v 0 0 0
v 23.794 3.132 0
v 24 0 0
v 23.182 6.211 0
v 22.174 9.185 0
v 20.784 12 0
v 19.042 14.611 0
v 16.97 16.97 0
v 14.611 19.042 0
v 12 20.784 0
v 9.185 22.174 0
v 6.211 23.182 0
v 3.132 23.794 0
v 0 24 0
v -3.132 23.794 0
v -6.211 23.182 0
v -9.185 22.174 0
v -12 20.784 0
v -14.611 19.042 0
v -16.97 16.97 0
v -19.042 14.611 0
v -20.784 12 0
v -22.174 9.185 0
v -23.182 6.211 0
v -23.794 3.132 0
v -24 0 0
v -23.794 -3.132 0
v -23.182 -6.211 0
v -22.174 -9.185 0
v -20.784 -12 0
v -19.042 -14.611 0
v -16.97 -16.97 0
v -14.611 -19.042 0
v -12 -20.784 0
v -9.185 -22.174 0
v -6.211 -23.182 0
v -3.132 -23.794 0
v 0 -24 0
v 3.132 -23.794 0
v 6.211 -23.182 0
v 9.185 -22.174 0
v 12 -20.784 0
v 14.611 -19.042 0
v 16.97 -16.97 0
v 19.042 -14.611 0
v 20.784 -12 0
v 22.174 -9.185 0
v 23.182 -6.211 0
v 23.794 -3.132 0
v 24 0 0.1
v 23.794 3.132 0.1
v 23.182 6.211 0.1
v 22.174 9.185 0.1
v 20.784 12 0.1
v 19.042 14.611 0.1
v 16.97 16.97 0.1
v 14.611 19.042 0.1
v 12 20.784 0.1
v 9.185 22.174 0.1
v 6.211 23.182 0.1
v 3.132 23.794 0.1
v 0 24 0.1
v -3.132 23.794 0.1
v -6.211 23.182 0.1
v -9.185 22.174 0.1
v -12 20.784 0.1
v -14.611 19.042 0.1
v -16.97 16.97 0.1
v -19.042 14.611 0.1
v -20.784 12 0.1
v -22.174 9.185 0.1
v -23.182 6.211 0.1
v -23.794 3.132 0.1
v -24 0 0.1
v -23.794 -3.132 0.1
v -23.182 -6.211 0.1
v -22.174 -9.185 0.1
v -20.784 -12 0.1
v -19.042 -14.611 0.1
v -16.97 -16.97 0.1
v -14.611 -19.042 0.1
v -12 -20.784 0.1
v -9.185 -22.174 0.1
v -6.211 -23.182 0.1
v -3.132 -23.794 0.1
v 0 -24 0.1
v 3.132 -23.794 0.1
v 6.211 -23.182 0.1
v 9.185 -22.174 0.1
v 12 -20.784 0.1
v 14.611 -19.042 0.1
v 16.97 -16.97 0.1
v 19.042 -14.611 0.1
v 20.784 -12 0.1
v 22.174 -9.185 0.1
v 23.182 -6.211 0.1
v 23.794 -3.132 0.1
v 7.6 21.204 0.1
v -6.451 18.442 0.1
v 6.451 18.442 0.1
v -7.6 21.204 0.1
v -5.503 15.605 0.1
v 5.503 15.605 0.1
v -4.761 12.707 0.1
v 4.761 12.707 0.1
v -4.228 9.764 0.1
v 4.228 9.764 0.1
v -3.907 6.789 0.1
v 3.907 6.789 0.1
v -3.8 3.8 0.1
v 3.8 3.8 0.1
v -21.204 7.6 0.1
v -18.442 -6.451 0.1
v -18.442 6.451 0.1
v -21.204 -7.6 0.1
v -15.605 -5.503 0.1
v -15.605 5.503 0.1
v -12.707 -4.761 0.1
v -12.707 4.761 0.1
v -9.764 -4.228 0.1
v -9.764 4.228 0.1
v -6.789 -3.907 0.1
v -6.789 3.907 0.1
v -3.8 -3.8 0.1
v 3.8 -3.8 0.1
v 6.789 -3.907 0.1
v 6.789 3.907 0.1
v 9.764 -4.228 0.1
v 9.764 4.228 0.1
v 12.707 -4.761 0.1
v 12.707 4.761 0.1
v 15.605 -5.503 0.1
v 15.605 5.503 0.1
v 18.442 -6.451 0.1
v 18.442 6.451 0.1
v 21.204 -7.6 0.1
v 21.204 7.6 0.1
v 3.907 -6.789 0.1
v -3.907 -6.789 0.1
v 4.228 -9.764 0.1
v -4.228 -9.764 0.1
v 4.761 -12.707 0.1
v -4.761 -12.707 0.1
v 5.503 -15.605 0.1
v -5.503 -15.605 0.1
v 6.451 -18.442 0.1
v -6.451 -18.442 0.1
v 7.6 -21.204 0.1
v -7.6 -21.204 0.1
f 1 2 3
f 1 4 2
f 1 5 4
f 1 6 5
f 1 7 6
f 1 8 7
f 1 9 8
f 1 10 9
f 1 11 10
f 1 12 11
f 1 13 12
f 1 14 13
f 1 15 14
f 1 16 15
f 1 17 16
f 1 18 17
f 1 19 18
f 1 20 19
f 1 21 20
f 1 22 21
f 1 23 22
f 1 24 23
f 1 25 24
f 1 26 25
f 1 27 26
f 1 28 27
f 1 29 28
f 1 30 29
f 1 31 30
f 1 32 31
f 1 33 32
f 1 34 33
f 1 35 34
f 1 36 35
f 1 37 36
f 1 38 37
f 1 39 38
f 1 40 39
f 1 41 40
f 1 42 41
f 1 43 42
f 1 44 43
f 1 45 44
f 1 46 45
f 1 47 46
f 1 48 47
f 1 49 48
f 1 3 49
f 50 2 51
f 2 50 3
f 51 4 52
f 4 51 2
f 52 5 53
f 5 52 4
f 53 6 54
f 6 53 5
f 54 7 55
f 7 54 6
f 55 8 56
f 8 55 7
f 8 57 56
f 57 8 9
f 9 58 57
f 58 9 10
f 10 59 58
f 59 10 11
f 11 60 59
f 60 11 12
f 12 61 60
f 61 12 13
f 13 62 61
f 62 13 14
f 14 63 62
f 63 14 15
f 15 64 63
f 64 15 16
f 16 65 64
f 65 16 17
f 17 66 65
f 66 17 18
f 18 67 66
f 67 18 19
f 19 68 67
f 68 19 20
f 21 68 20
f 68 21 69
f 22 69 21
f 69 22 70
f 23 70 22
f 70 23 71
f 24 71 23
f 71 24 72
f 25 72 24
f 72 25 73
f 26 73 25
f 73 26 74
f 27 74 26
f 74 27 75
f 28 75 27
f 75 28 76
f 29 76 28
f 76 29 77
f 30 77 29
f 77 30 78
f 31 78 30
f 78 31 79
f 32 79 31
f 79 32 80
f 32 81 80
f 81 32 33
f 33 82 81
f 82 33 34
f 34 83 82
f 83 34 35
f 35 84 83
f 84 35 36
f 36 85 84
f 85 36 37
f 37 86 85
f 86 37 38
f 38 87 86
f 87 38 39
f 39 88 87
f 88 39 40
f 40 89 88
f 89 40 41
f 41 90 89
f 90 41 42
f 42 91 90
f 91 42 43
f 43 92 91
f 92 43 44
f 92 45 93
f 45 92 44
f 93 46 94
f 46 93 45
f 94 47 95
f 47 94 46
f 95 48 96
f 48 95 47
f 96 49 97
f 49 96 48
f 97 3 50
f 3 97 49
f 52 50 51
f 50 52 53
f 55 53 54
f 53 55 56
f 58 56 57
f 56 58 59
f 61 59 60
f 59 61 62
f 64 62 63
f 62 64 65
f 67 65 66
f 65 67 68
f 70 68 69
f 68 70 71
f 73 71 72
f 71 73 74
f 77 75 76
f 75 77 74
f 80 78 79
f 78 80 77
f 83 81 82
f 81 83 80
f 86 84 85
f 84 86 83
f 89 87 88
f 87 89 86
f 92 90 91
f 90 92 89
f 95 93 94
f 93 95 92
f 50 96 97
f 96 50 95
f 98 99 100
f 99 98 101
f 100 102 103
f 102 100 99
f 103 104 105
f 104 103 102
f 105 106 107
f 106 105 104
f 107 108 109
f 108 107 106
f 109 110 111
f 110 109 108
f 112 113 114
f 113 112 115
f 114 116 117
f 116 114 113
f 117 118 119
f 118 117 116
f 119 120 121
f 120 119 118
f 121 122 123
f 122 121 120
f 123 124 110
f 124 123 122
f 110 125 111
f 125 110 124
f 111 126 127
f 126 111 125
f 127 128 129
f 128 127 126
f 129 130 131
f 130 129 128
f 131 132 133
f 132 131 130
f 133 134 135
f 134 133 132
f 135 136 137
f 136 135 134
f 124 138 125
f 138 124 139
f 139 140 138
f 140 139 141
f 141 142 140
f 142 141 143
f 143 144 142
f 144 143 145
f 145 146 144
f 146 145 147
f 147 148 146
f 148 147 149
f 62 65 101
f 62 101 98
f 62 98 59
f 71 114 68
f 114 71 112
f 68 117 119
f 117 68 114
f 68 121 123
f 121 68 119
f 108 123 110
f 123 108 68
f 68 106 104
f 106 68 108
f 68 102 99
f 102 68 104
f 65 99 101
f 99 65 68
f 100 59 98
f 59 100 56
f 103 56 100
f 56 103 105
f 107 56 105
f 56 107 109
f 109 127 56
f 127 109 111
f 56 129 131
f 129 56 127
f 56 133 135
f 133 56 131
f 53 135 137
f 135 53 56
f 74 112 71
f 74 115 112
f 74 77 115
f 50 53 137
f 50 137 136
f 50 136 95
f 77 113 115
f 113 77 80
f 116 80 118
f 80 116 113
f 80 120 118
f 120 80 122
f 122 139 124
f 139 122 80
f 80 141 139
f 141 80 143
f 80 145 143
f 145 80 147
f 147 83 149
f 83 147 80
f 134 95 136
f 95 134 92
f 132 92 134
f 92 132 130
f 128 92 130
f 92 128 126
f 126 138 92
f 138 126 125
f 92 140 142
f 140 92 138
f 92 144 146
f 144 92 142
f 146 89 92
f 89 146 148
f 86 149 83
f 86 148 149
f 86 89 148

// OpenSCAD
// file: ../p/48/1-4cyli.scad
use <../../lib.scad>
function ldraw_lib__48__1_4cyli() = [
// 0 Hi-Res Cylinder 0.25
// 0 Name: 48\1-4cyli.dat
// 0 Author: Manfred Moolhuysen
// 0 !LDRAW_ORG 48_Primitive UPDATE 2009-01
// 0 !LICENSE Licensed under CC BY 2.0 and CC BY 4.0 : see CAreadme.txt
// 
// 0 BFC CERTIFY CCW
  [0,"BFC","CERTIFY"],
  [0,"BFC","CCW"],
// 
// 0 !HISTORY 1999-07-05 [PTadmin] Official Update 1999-05
// 0 !HISTORY 2002-02-28 [hafhead] Added BFC statement
// 0 !HISTORY 2002-04-25 [PTadmin] Official Update 2002-02
// 0 !HISTORY 2007-06-24 [PTadmin] Header formatted for Contributor Agreement
// 0 !HISTORY 2008-07-01 [PTadmin] Official Update 2008-01
// 0 !HISTORY 2008-07-07 [guyvivan] Made BFC'ed CCW (2005-12-06)
// 0 !HISTORY 2009-05-02 [PTadmin] Official Update 2009-01
// 
// 
// 4 16 0.9914 0 0.1305 1 0 0 1 1 0 0.9914 1 0.1305
  [4,16,0.9914,0,0.1305,1,0,0,1,1,0,0.9914,1,0.1305],
// 4 16 0.9659 0 0.2588 0.9914 0 0.1305 0.9914 1 0.1305 0.9659 1 0.2588
  [4,16,0.9659,0,0.2588,0.9914,0,0.1305,0.9914,1,0.1305,0.9659,1,0.2588],
// 4 16 0.9239 0 0.3827 0.9659 0 0.2588 0.9659 1 0.2588 0.9239 1 0.3827
  [4,16,0.9239,0,0.3827,0.9659,0,0.2588,0.9659,1,0.2588,0.9239,1,0.3827],
// 4 16 0.866 0 0.5 0.9239 0 0.3827 0.9239 1 0.3827 0.866 1 0.5
  [4,16,0.866,0,0.5,0.9239,0,0.3827,0.9239,1,0.3827,0.866,1,0.5],
// 4 16 0.7934 0 0.6088 0.866 0 0.5 0.866 1 0.5 0.7934 1 0.6088
  [4,16,0.7934,0,0.6088,0.866,0,0.5,0.866,1,0.5,0.7934,1,0.6088],
// 4 16 0.7071 0 0.7071 0.7934 0 0.6088 0.7934 1 0.6088 0.7071 1 0.7071
  [4,16,0.7071,0,0.7071,0.7934,0,0.6088,0.7934,1,0.6088,0.7071,1,0.7071],
// 4 16 0.6088 0 0.7934 0.7071 0 0.7071 0.7071 1 0.7071 0.6088 1 0.7934
  [4,16,0.6088,0,0.7934,0.7071,0,0.7071,0.7071,1,0.7071,0.6088,1,0.7934],
// 4 16 0.5 0 0.866 0.6088 0 0.7934 0.6088 1 0.7934 0.5 1 0.866
  [4,16,0.5,0,0.866,0.6088,0,0.7934,0.6088,1,0.7934,0.5,1,0.866],
// 4 16 0.3827 0 0.9239 0.5 0 0.866 0.5 1 0.866 0.3827 1 0.9239
  [4,16,0.3827,0,0.9239,0.5,0,0.866,0.5,1,0.866,0.3827,1,0.9239],
// 4 16 0.2588 0 0.9659 0.3827 0 0.9239 0.3827 1 0.9239 0.2588 1 0.9659
  [4,16,0.2588,0,0.9659,0.3827,0,0.9239,0.3827,1,0.9239,0.2588,1,0.9659],
// 4 16 0.1305 0 0.9914 0.2588 0 0.9659 0.2588 1 0.9659 0.1305 1 0.9914
  [4,16,0.1305,0,0.9914,0.2588,0,0.9659,0.2588,1,0.9659,0.1305,1,0.9914],
// 4 16 0 0 1 0.1305 0 0.9914 0.1305 1 0.9914 0 1 1
  [4,16,0,0,1,0.1305,0,0.9914,0.1305,1,0.9914,0,1,1],
// 
// 0 conditional lines
// 5 24 1 1 0 1 0 0 1 1 -1 0.9914 1 0.1305
  [5,24,1,1,0,1,0,0,1,1,-1,0.9914,1,0.1305],
// 5 24 0.9914 1 0.1305 0.9914 0 0.1305 1 1 0 0.9659 1 0.2588
  [5,24,0.9914,1,0.1305,0.9914,0,0.1305,1,1,0,0.9659,1,0.2588],
// 5 24 0.9659 1 0.2588 0.9659 0 0.2588 0.9914 1 0.1305 0.9239 1 0.3827
  [5,24,0.9659,1,0.2588,0.9659,0,0.2588,0.9914,1,0.1305,0.9239,1,0.3827],
// 5 24 0.9239 1 0.3827 0.9239 0 0.3827 0.9659 1 0.2588 0.866 1 0.5
  [5,24,0.9239,1,0.3827,0.9239,0,0.3827,0.9659,1,0.2588,0.866,1,0.5],
// 5 24 0.866 1 0.5 0.866 0 0.5 0.9239 1 0.3827 0.7934 1 0.6088
  [5,24,0.866,1,0.5,0.866,0,0.5,0.9239,1,0.3827,0.7934,1,0.6088],
// 5 24 0.7934 1 0.6088 0.7934 0 0.6088 0.866 1 0.5 0.7071 1 0.7071
  [5,24,0.7934,1,0.6088,0.7934,0,0.6088,0.866,1,0.5,0.7071,1,0.7071],
// 5 24 0.7071 1 0.7071 0.7071 0 0.7071 0.7934 1 0.6088 0.6088 1 0.7934
  [5,24,0.7071,1,0.7071,0.7071,0,0.7071,0.7934,1,0.6088,0.6088,1,0.7934],
// 5 24 0.6088 1 0.7934 0.6088 0 0.7934 0.7071 1 0.7071 0.5 1 0.866
  [5,24,0.6088,1,0.7934,0.6088,0,0.7934,0.7071,1,0.7071,0.5,1,0.866],
// 5 24 0.5 1 0.866 0.5 0 0.866 0.6088 1 0.7934 0.3827 1 0.9239
  [5,24,0.5,1,0.866,0.5,0,0.866,0.6088,1,0.7934,0.3827,1,0.9239],
// 5 24 0.3827 1 0.9239 0.3827 0 0.9239 0.5 1 0.866 0.2588 1 0.9659
  [5,24,0.3827,1,0.9239,0.3827,0,0.9239,0.5,1,0.866,0.2588,1,0.9659],
// 5 24 0.2588 1 0.9659 0.2588 0 0.9659 0.3827 1 0.9239 0.1305 1 0.9914
  [5,24,0.2588,1,0.9659,0.2588,0,0.9659,0.3827,1,0.9239,0.1305,1,0.9914],
// 5 24 0.1305 1 0.9914 0.1305 0 0.9914 0.2588 1 0.9659 0 1 1
  [5,24,0.1305,1,0.9914,0.1305,0,0.9914,0.2588,1,0.9659,0,1,1],
// 5 24 0 1 1 0 0 1 0.1305 1 0.9914 -1 1 1
  [5,24,0,1,1,0,0,1,0.1305,1,0.9914,-1,1,1],
// 
// 0 end of file
];
module ldraw_lib__48__1_4cyli(step=0, col=false, unit=2/5, alt=false, line=0.2, solid=!$preview)
    makepoly(ldraw_lib__48__1_4cyli(), step=step, col=col, unit=unit, alt=alt, line=line, solid=solid);
ldraw_lib__48__1_4cyli(line=0.2);
// file: ../p/48/4-4disc.scad
use <../../lib.scad>
function ldraw_lib__48__4_4disc() = [
// 0 Hi-Res Disc 1.0
// 0 Name: 48\4-4disc.dat
// 0 Author: Miklos Hosszu [hmick]
// 0 !LDRAW_ORG 48_Primitive UPDATE 2012-02
// 0 !LICENSE Licensed under CC BY 2.0 and CC BY 4.0 : see CAreadme.txt
// 
// 0 BFC CERTIFY CCW
  [0,"BFC","CERTIFY"],
  [0,"BFC","CCW"],
// 
// 0 !HISTORY 2004-11-06 [PTadmin] Official Update 2004-04
// 0 !HISTORY 2007-06-24 [PTadmin] Header formatted for Contributor Agreement
// 0 !HISTORY 2008-07-01 [PTadmin] Official Update 2008-01
// 0 !HISTORY 2012-02-27 [Philo] Changed to CCW
// 0 !HISTORY 2012-08-09 [PTadmin] Official Update 2012-02
// 
// 
// 3 16 1 0 0 0.9914 0 0.1305 0 0 0
  [3,16,1,0,0,0.9914,0,0.1305,0,0,0],
// 3 16 0.9914 0 0.1305 0.9659 0 0.2588 0 0 0
  [3,16,0.9914,0,0.1305,0.9659,0,0.2588,0,0,0],
// 3 16 0.9659 0 0.2588 0.9239 0 0.3827 0 0 0
  [3,16,0.9659,0,0.2588,0.9239,0,0.3827,0,0,0],
// 3 16 0.9239 0 0.3827 0.866 0 0.5 0 0 0
  [3,16,0.9239,0,0.3827,0.866,0,0.5,0,0,0],
// 3 16 0.866 0 0.5 0.7934 0 0.6088 0 0 0
  [3,16,0.866,0,0.5,0.7934,0,0.6088,0,0,0],
// 3 16 0.7934 0 0.6088 0.7071 0 0.7071 0 0 0
  [3,16,0.7934,0,0.6088,0.7071,0,0.7071,0,0,0],
// 3 16 0.7071 0 0.7071 0.6088 0 0.7934 0 0 0
  [3,16,0.7071,0,0.7071,0.6088,0,0.7934,0,0,0],
// 3 16 0.6088 0 0.7934 0.5 0 0.866 0 0 0
  [3,16,0.6088,0,0.7934,0.5,0,0.866,0,0,0],
// 3 16 0.5 0 0.866 0.3827 0 0.9239 0 0 0
  [3,16,0.5,0,0.866,0.3827,0,0.9239,0,0,0],
// 3 16 0.3827 0 0.9239 0.2588 0 0.9659 0 0 0
  [3,16,0.3827,0,0.9239,0.2588,0,0.9659,0,0,0],
// 3 16 0.2588 0 0.9659 0.1305 0 0.9914 0 0 0
  [3,16,0.2588,0,0.9659,0.1305,0,0.9914,0,0,0],
// 3 16 0.1305 0 0.9914 0 0 1 0 0 0
  [3,16,0.1305,0,0.9914,0,0,1,0,0,0],
// 3 16 0 0 1 -0.1305 0 0.9914 0 0 0
  [3,16,0,0,1,-0.1305,0,0.9914,0,0,0],
// 3 16 -0.1305 0 0.9914 -0.2588 0 0.9659 0 0 0
  [3,16,-0.1305,0,0.9914,-0.2588,0,0.9659,0,0,0],
// 3 16 -0.2588 0 0.9659 -0.3827 0 0.9239 0 0 0
  [3,16,-0.2588,0,0.9659,-0.3827,0,0.9239,0,0,0],
// 3 16 -0.3827 0 0.9239 -0.5 0 0.866 0 0 0
  [3,16,-0.3827,0,0.9239,-0.5,0,0.866,0,0,0],
// 3 16 -0.5 0 0.866 -0.6088 0 0.7934 0 0 0
  [3,16,-0.5,0,0.866,-0.6088,0,0.7934,0,0,0],
// 3 16 -0.6088 0 0.7934 -0.7071 0 0.7071 0 0 0
  [3,16,-0.6088,0,0.7934,-0.7071,0,0.7071,0,0,0],
// 3 16 -0.7071 0 0.7071 -0.7934 0 0.6088 0 0 0
  [3,16,-0.7071,0,0.7071,-0.7934,0,0.6088,0,0,0],
// 3 16 -0.7934 0 0.6088 -0.866 0 0.5 0 0 0
  [3,16,-0.7934,0,0.6088,-0.866,0,0.5,0,0,0],
// 3 16 -0.866 0 0.5 -0.9239 0 0.3827 0 0 0
  [3,16,-0.866,0,0.5,-0.9239,0,0.3827,0,0,0],
// 3 16 -0.9239 0 0.3827 -0.9659 0 0.2588 0 0 0
  [3,16,-0.9239,0,0.3827,-0.9659,0,0.2588,0,0,0],
// 3 16 -0.9659 0 0.2588 -0.9914 0 0.1305 0 0 0
  [3,16,-0.9659,0,0.2588,-0.9914,0,0.1305,0,0,0],
// 3 16 -0.9914 0 0.1305 -1 0 0 0 0 0
  [3,16,-0.9914,0,0.1305,-1,0,0,0,0,0],
// 3 16 -1 0 0 -0.9914 0 -0.1305 0 0 0
  [3,16,-1,0,0,-0.9914,0,-0.1305,0,0,0],
// 3 16 -0.9914 0 -0.1305 -0.9659 0 -0.2588 0 0 0
  [3,16,-0.9914,0,-0.1305,-0.9659,0,-0.2588,0,0,0],
// 3 16 -0.9659 0 -0.2588 -0.9239 0 -0.3827 0 0 0
  [3,16,-0.9659,0,-0.2588,-0.9239,0,-0.3827,0,0,0],
// 3 16 -0.9239 0 -0.3827 -0.866 0 -0.5 0 0 0
  [3,16,-0.9239,0,-0.3827,-0.866,0,-0.5,0,0,0],
// 3 16 -0.866 0 -0.5 -0.7934 0 -0.6088 0 0 0
  [3,16,-0.866,0,-0.5,-0.7934,0,-0.6088,0,0,0],
// 3 16 -0.7934 0 -0.6088 -0.7071 0 -0.7071 0 0 0
  [3,16,-0.7934,0,-0.6088,-0.7071,0,-0.7071,0,0,0],
// 3 16 -0.7071 0 -0.7071 -0.6088 0 -0.7934 0 0 0
  [3,16,-0.7071,0,-0.7071,-0.6088,0,-0.7934,0,0,0],
// 3 16 -0.6088 0 -0.7934 -0.5 0 -0.866 0 0 0
  [3,16,-0.6088,0,-0.7934,-0.5,0,-0.866,0,0,0],
// 3 16 -0.5 0 -0.866 -0.3827 0 -0.9239 0 0 0
  [3,16,-0.5,0,-0.866,-0.3827,0,-0.9239,0,0,0],
// 3 16 -0.3827 0 -0.9239 -0.2588 0 -0.9659 0 0 0
  [3,16,-0.3827,0,-0.9239,-0.2588,0,-0.9659,0,0,0],
// 3 16 -0.2588 0 -0.9659 -0.1305 0 -0.9914 0 0 0
  [3,16,-0.2588,0,-0.9659,-0.1305,0,-0.9914,0,0,0],
// 3 16 -0.1305 0 -0.9914 0 0 -1 0 0 0
  [3,16,-0.1305,0,-0.9914,0,0,-1,0,0,0],
// 3 16 0 0 -1 0.1305 0 -0.9914 0 0 0
  [3,16,0,0,-1,0.1305,0,-0.9914,0,0,0],
// 3 16 0.1305 0 -0.9914 0.2588 0 -0.9659 0 0 0
  [3,16,0.1305,0,-0.9914,0.2588,0,-0.9659,0,0,0],
// 3 16 0.2588 0 -0.9659 0.3827 0 -0.9239 0 0 0
  [3,16,0.2588,0,-0.9659,0.3827,0,-0.9239,0,0,0],
// 3 16 0.3827 0 -0.9239 0.5 0 -0.866 0 0 0
  [3,16,0.3827,0,-0.9239,0.5,0,-0.866,0,0,0],
// 3 16 0.5 0 -0.866 0.6088 0 -0.7934 0 0 0
  [3,16,0.5,0,-0.866,0.6088,0,-0.7934,0,0,0],
// 3 16 0.6088 0 -0.7934 0.7071 0 -0.7071 0 0 0
  [3,16,0.6088,0,-0.7934,0.7071,0,-0.7071,0,0,0],
// 3 16 0.7071 0 -0.7071 0.7934 0 -0.6088 0 0 0
  [3,16,0.7071,0,-0.7071,0.7934,0,-0.6088,0,0,0],
// 3 16 0.7934 0 -0.6088 0.866 0 -0.5 0 0 0
  [3,16,0.7934,0,-0.6088,0.866,0,-0.5,0,0,0],
// 3 16 0.866 0 -0.5 0.9239 0 -0.3827 0 0 0
  [3,16,0.866,0,-0.5,0.9239,0,-0.3827,0,0,0],
// 3 16 0.9239 0 -0.3827 0.9659 0 -0.2588 0 0 0
  [3,16,0.9239,0,-0.3827,0.9659,0,-0.2588,0,0,0],
// 3 16 0.9659 0 -0.2588 0.9914 0 -0.1305 0 0 0
  [3,16,0.9659,0,-0.2588,0.9914,0,-0.1305,0,0,0],
// 3 16 0.9914 0 -0.1305 1 0 0 0 0 0
  [3,16,0.9914,0,-0.1305,1,0,0,0,0,0],
];
module ldraw_lib__48__4_4disc(step=0, col=false, unit=2/5, alt=false, line=0.2, solid=!$preview)
    makepoly(ldraw_lib__48__4_4disc(), step=step, col=col, unit=unit, alt=alt, line=line, solid=solid);
ldraw_lib__48__4_4disc(line=0.2);
// file: ../p/48/4-4cyli.scad
use <../../lib.scad>
use <1-4cyli.scad>
function ldraw_lib__48__4_4cyli() = [
// 0 Hi-Res Cylinder 1.0
// 0 Name: 48\4-4cyli.dat
// 0 Author: Paul Easter [pneaster]
// 0 !LDRAW_ORG 48_Primitive UPDATE 2012-02
// 0 !LICENSE Licensed under CC BY 4.0 : see CAreadme.txt
// 
// 0 BFC CERTIFY CCW
  [0,"BFC","CERTIFY"],
  [0,"BFC","CCW"],
// 
// 0 !HISTORY 2002-08-18 [PTadmin] Official Update 2002-04
// 0 !HISTORY 2007-06-24 [PTadmin] Header formatted for Contributor Agreement
// 0 !HISTORY 2008-07-01 [PTadmin] Official Update 2008-01
// 0 !HISTORY 2012-02-27 [Philo] Changed to CCW
// 0 !HISTORY 2012-08-09 [PTadmin] Official Update 2012-02
// 
// 
// 1 16 0 0 0 1 0 0 0 1 0 0 0 1 48\1-4cyli.dat
  [1,16,0,0,0,1,0,0,0,1,0,0,0,1, ldraw_lib__48__1_4cyli()],
// 1 16 0 0 0 0 0 -1 0 1 0 1 0 0 48\1-4cyli.dat
  [1,16,0,0,0,0,0,-1,0,1,0,1,0,0, ldraw_lib__48__1_4cyli()],
// 1 16 0 0 0 -1 0 0 0 1 0 0 0 -1 48\1-4cyli.dat
  [1,16,0,0,0,-1,0,0,0,1,0,0,0,-1, ldraw_lib__48__1_4cyli()],
// 1 16 0 0 0 0 0 1 0 1 0 -1 0 0 48\1-4cyli.dat
  [1,16,0,0,0,0,0,1,0,1,0,-1,0,0, ldraw_lib__48__1_4cyli()],
];
module ldraw_lib__48__4_4cyli(step=0, col=false, unit=2/5, alt=false, line=0.2, solid=!$preview)
    makepoly(ldraw_lib__48__4_4cyli(), step=step, col=col, unit=unit, alt=alt, line=line, solid=solid);
ldraw_lib__48__4_4cyli(line=0.2);
// file: ../p/48/4-4aring.scad
use <../../lib.scad>
function ldraw_lib__48__4_4aring() = [
// 0 Adapter Ring Hi-Res to Normal 1.0
// 0 Name: 48\4-4aring.dat
// 0 Author: Philippe Hurbain [Philo]
// 0 !LDRAW_ORG 48_Primitive UPDATE 2010-02
// 0 !LICENSE Licensed under CC BY 4.0 : see CAreadme.txt
// 
// 0 BFC CERTIFY CCW
  [0,"BFC","CERTIFY"],
  [0,"BFC","CCW"],
// 
// 0 !HISTORY 2010-07-05 [PTadmin] Official Update 2010-02
// 
// 
// 4 16 0.9239 0 0.3827 1 0 0 0.9914 0 0.1305 0.9659 0 0.2588
  [4,16,0.9239,0,0.3827,1,0,0,0.9914,0,0.1305,0.9659,0,0.2588],
// 4 16 0.7071 0 0.7071 0.9239 0 0.3827 0.866 0 0.5 0.7934 0 0.6088
  [4,16,0.7071,0,0.7071,0.9239,0,0.3827,0.866,0,0.5,0.7934,0,0.6088],
// 4 16 0.3827 0 0.9239 0.7071 0 0.7071 0.6088 0 0.7934 0.5 0 0.866
  [4,16,0.3827,0,0.9239,0.7071,0,0.7071,0.6088,0,0.7934,0.5,0,0.866],
// 4 16 0 0 1 0.3827 0 0.9239 0.2588 0 0.9659 0.1305 0 0.9914
  [4,16,0,0,1,0.3827,0,0.9239,0.2588,0,0.9659,0.1305,0,0.9914],
// 4 16 -0.3827 0 0.9239 0 0 1 -0.1305 0 0.9914 -0.2588 0 0.9659
  [4,16,-0.3827,0,0.9239,0,0,1,-0.1305,0,0.9914,-0.2588,0,0.9659],
// 4 16 -0.7071 0 0.7071 -0.3827 0 0.9239 -0.5 0 0.866 -0.6088 0 0.7934
  [4,16,-0.7071,0,0.7071,-0.3827,0,0.9239,-0.5,0,0.866,-0.6088,0,0.7934],
// 4 16 -0.9239 0 0.3827 -0.7071 0 0.7071 -0.7934 0 0.6088 -0.866 0 0.5
  [4,16,-0.9239,0,0.3827,-0.7071,0,0.7071,-0.7934,0,0.6088,-0.866,0,0.5],
// 4 16 -1 0 0 -0.9239 0 0.3827 -0.9659 0 0.2588 -0.9914 0 0.1305
  [4,16,-1,0,0,-0.9239,0,0.3827,-0.9659,0,0.2588,-0.9914,0,0.1305],
// 4 16 -0.9239 0 -0.3827 -1 0 0 -0.9914 0 -0.1305 -0.9659 0 -0.2588
  [4,16,-0.9239,0,-0.3827,-1,0,0,-0.9914,0,-0.1305,-0.9659,0,-0.2588],
// 4 16 -0.7071 0 -0.7071 -0.9239 0 -0.3827 -0.866 0 -0.5 -0.7934 0 -0.6088
  [4,16,-0.7071,0,-0.7071,-0.9239,0,-0.3827,-0.866,0,-0.5,-0.7934,0,-0.6088],
// 4 16 -0.3827 0 -0.9239 -0.7071 0 -0.7071 -0.6088 0 -0.7934 -0.5 0 -0.866
  [4,16,-0.3827,0,-0.9239,-0.7071,0,-0.7071,-0.6088,0,-0.7934,-0.5,0,-0.866],
// 4 16 0 0 -1 -0.3827 0 -0.9239 -0.2588 0 -0.9659 -0.1305 0 -0.9914
  [4,16,0,0,-1,-0.3827,0,-0.9239,-0.2588,0,-0.9659,-0.1305,0,-0.9914],
// 4 16 0.3827 0 -0.9239 0 0 -1 0.1305 0 -0.9914 0.2588 0 -0.9659
  [4,16,0.3827,0,-0.9239,0,0,-1,0.1305,0,-0.9914,0.2588,0,-0.9659],
// 4 16 0.7071 0 -0.7071 0.3827 0 -0.9239 0.5 0 -0.866 0.6088 0 -0.7934
  [4,16,0.7071,0,-0.7071,0.3827,0,-0.9239,0.5,0,-0.866,0.6088,0,-0.7934],
// 4 16 0.9239 0 -0.3827 0.7071 0 -0.7071 0.7934 0 -0.6088 0.866 0 -0.5
  [4,16,0.9239,0,-0.3827,0.7071,0,-0.7071,0.7934,0,-0.6088,0.866,0,-0.5],
// 4 16 1 0 0 0.9239 0 -0.3827 0.9659 0 -0.2588 0.9914 0 -0.1305
  [4,16,1,0,0,0.9239,0,-0.3827,0.9659,0,-0.2588,0.9914,0,-0.1305],
// 0 //
];
module ldraw_lib__48__4_4aring(step=0, col=false, unit=2/5, alt=false, line=0.2, solid=!$preview)
    makepoly(ldraw_lib__48__4_4aring(), step=step, col=col, unit=unit, alt=alt, line=line, solid=solid);
ldraw_lib__48__4_4aring(line=0.2);
// main file
use <../lib.scad>
use <../p/48/4-4aring.scad>
use <../p/48/4-4cyli.scad>
use <../p/48/4-4disc.scad>
function ldraw_lib__4179107d() = [
// 0 Sticker  6.0 x  6.0 Round with Black Iron Cross on White Background
// 0 Name: 4179107d.dat
// 0 Author: Massimo Maso [Sirio]
// 0 !LDRAW_ORG Part UPDATE 2022-06
// 0 !LICENSE Licensed under CC BY 4.0 : see CAreadme.txt
// 
// 0 BFC CERTIFY CCW
  [0,"BFC","CERTIFY"],
  [0,"BFC","CCW"],
// 
// 0 !KEYWORDS Bricklink 10024stk01, Brickowl 275196, Fokker Dr. I
// 0 !KEYWORDS Rebrickable 44236, Red Baron, Sculptures, Set 10024, Triplane
// 
// 0 !HISTORY 2022-12-20 [PTadmin] Official Update 2022-06
// 
// 
// 0 // Primitives
// 
// 1 16 0 0 0 60 0 0 0 -1 0 0 0 60 48\4-4disc.dat
  [1,16,0,0,0,60,0,0,0,-1,0,0,0,60, ldraw_lib__48__4_4disc()],
// 1 16 0 -.25 0 60 0 0 0 0.25 0 0 0 60 48\4-4cyli.dat
  [1,16,0,-.25,0,60,0,0,0,0.25,0,0,0,60, ldraw_lib__48__4_4cyli()],
// 1 15 0 -.25 0 60 0 0 0 1 0 0 0 60 48\4-4aring.dat
  [1,15,0,-.25,0,60,0,0,0,1,0,0,0,60, ldraw_lib__48__4_4aring()],
// 0 // Top faces
// 0 // Black faces
// 4 0 -16.1284 -.25 46.1049 16.1284 -.25 46.1049 19 -.25 53.01 -19 -.25 53.01
  [4,0,-16.1284,-.25,46.1049,16.1284,-.25,46.1049,19,-.25,53.01,-19,-.25,53.01],
// 4 0 -16.1284 -.25 46.1049 -13.7586 -.25 39.0119 13.7586 -.25 39.0119 16.1284 -.25 46.1049
  [4,0,-16.1284,-.25,46.1049,-13.7586,-.25,39.0119,13.7586,-.25,39.0119,16.1284,-.25,46.1049],
// 4 0 -11.9027 -.25 31.7675 11.9027 -.25 31.7675 13.7586 -.25 39.0119 -13.7586 -.25 39.0119
  [4,0,-11.9027,-.25,31.7675,11.9027,-.25,31.7675,13.7586,-.25,39.0119,-13.7586,-.25,39.0119],
// 4 0 -11.9027 -.25 31.7675 -10.5701 -.25 24.4088 10.5701 -.25 24.4088 11.9027 -.25 31.7675
  [4,0,-11.9027,-.25,31.7675,-10.5701,-.25,24.4088,10.5701,-.25,24.4088,11.9027,-.25,31.7675],
// 4 0 -9.7679 -.25 16.9736 9.7679 -.25 16.9736 10.5701 -.25 24.4088 -10.5701 -.25 24.4088
  [4,0,-9.7679,-.25,16.9736,9.7679,-.25,16.9736,10.5701,-.25,24.4088,-10.5701,-.25,24.4088],
// 4 0 -9.7679 -.25 16.9736 -9.5 -.25 9.5 9.5 -.25 9.5 9.7679 -.25 16.9736
  [4,0,-9.7679,-.25,16.9736,-9.5,-.25,9.5,9.5,-.25,9.5,9.7679,-.25,16.9736],
// 4 0 -46.1049 -.25 16.1284 -53.01 -.25 19 -53.01 -.25 -19 -46.1049 -.25 -16.1284
  [4,0,-46.1049,-.25,16.1284,-53.01,-.25,19,-53.01,-.25,-19,-46.1049,-.25,-16.1284],
// 4 0 -46.1049 -.25 16.1284 -46.1049 -.25 -16.1284 -39.0119 -.25 -13.7586 -39.0119 -.25 13.7586
  [4,0,-46.1049,-.25,16.1284,-46.1049,-.25,-16.1284,-39.0119,-.25,-13.7586,-39.0119,-.25,13.7586],
// 4 0 -31.7675 -.25 11.9027 -39.0119 -.25 13.7586 -39.0119 -.25 -13.7586 -31.7675 -.25 -11.9027
  [4,0,-31.7675,-.25,11.9027,-39.0119,-.25,13.7586,-39.0119,-.25,-13.7586,-31.7675,-.25,-11.9027],
// 4 0 -31.7675 -.25 11.9027 -31.7675 -.25 -11.9027 -24.4088 -.25 -10.5701 -24.4088 -.25 10.5701
  [4,0,-31.7675,-.25,11.9027,-31.7675,-.25,-11.9027,-24.4088,-.25,-10.5701,-24.4088,-.25,10.5701],
// 4 0 -16.9736 -.25 9.7679 -24.4088 -.25 10.5701 -24.4088 -.25 -10.5701 -16.9736 -.25 -9.7679
  [4,0,-16.9736,-.25,9.7679,-24.4088,-.25,10.5701,-24.4088,-.25,-10.5701,-16.9736,-.25,-9.7679],
// 4 0 -16.9736 -.25 9.7679 -16.9736 -.25 -9.7679 -9.5 -.25 -9.5 -9.5 -.25 9.5
  [4,0,-16.9736,-.25,9.7679,-16.9736,-.25,-9.7679,-9.5,-.25,-9.5,-9.5,-.25,9.5],
// 4 0 -9.5 -.25 9.5 -9.5 -.25 -9.5 9.5 -.25 -9.5 9.5 -.25 9.5
  [4,0,-9.5,-.25,9.5,-9.5,-.25,-9.5,9.5,-.25,-9.5,9.5,-.25,9.5],
// 4 0 16.9736 -.25 9.7679 9.5 -.25 9.5 9.5 -.25 -9.5 16.9736 -.25 -9.7679
  [4,0,16.9736,-.25,9.7679,9.5,-.25,9.5,9.5,-.25,-9.5,16.9736,-.25,-9.7679],
// 4 0 16.9736 -.25 9.7679 16.9736 -.25 -9.7679 24.4088 -.25 -10.5701 24.4088 -.25 10.5701
  [4,0,16.9736,-.25,9.7679,16.9736,-.25,-9.7679,24.4088,-.25,-10.5701,24.4088,-.25,10.5701],
// 4 0 31.7675 -.25 11.9027 24.4088 -.25 10.5701 24.4088 -.25 -10.5701 31.7675 -.25 -11.9027
  [4,0,31.7675,-.25,11.9027,24.4088,-.25,10.5701,24.4088,-.25,-10.5701,31.7675,-.25,-11.9027],
// 4 0 31.7675 -.25 11.9027 31.7675 -.25 -11.9027 39.0119 -.25 -13.7586 39.0119 -.25 13.7586
  [4,0,31.7675,-.25,11.9027,31.7675,-.25,-11.9027,39.0119,-.25,-13.7586,39.0119,-.25,13.7586],
// 4 0 46.1049 -.25 16.1284 39.0119 -.25 13.7586 39.0119 -.25 -13.7586 46.1049 -.25 -16.1284
  [4,0,46.1049,-.25,16.1284,39.0119,-.25,13.7586,39.0119,-.25,-13.7586,46.1049,-.25,-16.1284],
// 4 0 46.1049 -.25 16.1284 46.1049 -.25 -16.1284 53.01 -.25 -19 53.01 -.25 19
  [4,0,46.1049,-.25,16.1284,46.1049,-.25,-16.1284,53.01,-.25,-19,53.01,-.25,19],
// 4 0 -9.7679 -.25 -16.9736 9.7679 -.25 -16.9736 9.5 -.25 -9.5 -9.5 -.25 -9.5
  [4,0,-9.7679,-.25,-16.9736,9.7679,-.25,-16.9736,9.5,-.25,-9.5,-9.5,-.25,-9.5],
// 4 0 -9.7679 -.25 -16.9736 -10.5701 -.25 -24.4088 10.5701 -.25 -24.4088 9.7679 -.25 -16.9736
  [4,0,-9.7679,-.25,-16.9736,-10.5701,-.25,-24.4088,10.5701,-.25,-24.4088,9.7679,-.25,-16.9736],
// 4 0 -11.9027 -.25 -31.7675 11.9027 -.25 -31.7675 10.5701 -.25 -24.4088 -10.5701 -.25 -24.4088
  [4,0,-11.9027,-.25,-31.7675,11.9027,-.25,-31.7675,10.5701,-.25,-24.4088,-10.5701,-.25,-24.4088],
// 4 0 -11.9027 -.25 -31.7675 -13.7586 -.25 -39.0119 13.7586 -.25 -39.0119 11.9027 -.25 -31.7675
  [4,0,-11.9027,-.25,-31.7675,-13.7586,-.25,-39.0119,13.7586,-.25,-39.0119,11.9027,-.25,-31.7675],
// 4 0 -16.1284 -.25 -46.1049 16.1284 -.25 -46.1049 13.7586 -.25 -39.0119 -13.7586 -.25 -39.0119
  [4,0,-16.1284,-.25,-46.1049,16.1284,-.25,-46.1049,13.7586,-.25,-39.0119,-13.7586,-.25,-39.0119],
// 4 0 -16.1284 -.25 -46.1049 -19 -.25 -53.01 19 -.25 -53.01 16.1284 -.25 -46.1049
  [4,0,-16.1284,-.25,-46.1049,-19,-.25,-53.01,19,-.25,-53.01,16.1284,-.25,-46.1049],
// 0 // White faces
// 3 15 0 -.25 60 -22.962 -.25 55.434 -19 -.25 53.01
  [3,15,0,-.25,60,-22.962,-.25,55.434,-19,-.25,53.01],
// 3 15 0 -.25 60 -19 -.25 53.01 19 -.25 53.01
  [3,15,0,-.25,60,-19,-.25,53.01,19,-.25,53.01],
// 3 15 0 -.25 60 19 -.25 53.01 22.962 -.25 55.434
  [3,15,0,-.25,60,19,-.25,53.01,22.962,-.25,55.434],
// 4 15 -42.426 -.25 42.426 -55.434 -.25 22.962 -53.01 -.25 19 -46.1049 -.25 16.1284
  [4,15,-42.426,-.25,42.426,-55.434,-.25,22.962,-53.01,-.25,19,-46.1049,-.25,16.1284],
// 4 15 -42.426 -.25 42.426 -46.1049 -.25 16.1284 -39.0119 -.25 13.7586 -31.7675 -.25 11.9027
  [4,15,-42.426,-.25,42.426,-46.1049,-.25,16.1284,-39.0119,-.25,13.7586,-31.7675,-.25,11.9027],
// 4 15 -42.426 -.25 42.426 -31.7675 -.25 11.9027 -24.4088 -.25 10.5701 -16.9736 -.25 9.7679
  [4,15,-42.426,-.25,42.426,-31.7675,-.25,11.9027,-24.4088,-.25,10.5701,-16.9736,-.25,9.7679],
// 4 15 -42.426 -.25 42.426 -16.9736 -.25 9.7679 -9.5 -.25 9.5 -9.7679 -.25 16.9736
  [4,15,-42.426,-.25,42.426,-16.9736,-.25,9.7679,-9.5,-.25,9.5,-9.7679,-.25,16.9736],
// 4 15 -42.426 -.25 42.426 -9.7679 -.25 16.9736 -10.5701 -.25 24.4088 -11.9027 -.25 31.7675
  [4,15,-42.426,-.25,42.426,-9.7679,-.25,16.9736,-10.5701,-.25,24.4088,-11.9027,-.25,31.7675],
// 4 15 -42.426 -.25 42.426 -11.9027 -.25 31.7675 -13.7586 -.25 39.0119 -16.1284 -.25 46.1049
  [4,15,-42.426,-.25,42.426,-11.9027,-.25,31.7675,-13.7586,-.25,39.0119,-16.1284,-.25,46.1049],
// 4 15 -42.426 -.25 42.426 -16.1284 -.25 46.1049 -19 -.25 53.01 -22.962 -.25 55.434
  [4,15,-42.426,-.25,42.426,-16.1284,-.25,46.1049,-19,-.25,53.01,-22.962,-.25,55.434],
// 4 15 42.426 -.25 42.426 22.962 -.25 55.434 19 -.25 53.01 16.1284 -.25 46.1049
  [4,15,42.426,-.25,42.426,22.962,-.25,55.434,19,-.25,53.01,16.1284,-.25,46.1049],
// 4 15 42.426 -.25 42.426 16.1284 -.25 46.1049 13.7586 -.25 39.0119 11.9027 -.25 31.7675
  [4,15,42.426,-.25,42.426,16.1284,-.25,46.1049,13.7586,-.25,39.0119,11.9027,-.25,31.7675],
// 4 15 42.426 -.25 42.426 11.9027 -.25 31.7675 10.5701 -.25 24.4088 9.7679 -.25 16.9736
  [4,15,42.426,-.25,42.426,11.9027,-.25,31.7675,10.5701,-.25,24.4088,9.7679,-.25,16.9736],
// 4 15 42.426 -.25 42.426 9.7679 -.25 16.9736 9.5 -.25 9.5 16.9736 -.25 9.7679
  [4,15,42.426,-.25,42.426,9.7679,-.25,16.9736,9.5,-.25,9.5,16.9736,-.25,9.7679],
// 4 15 42.426 -.25 42.426 16.9736 -.25 9.7679 24.4088 -.25 10.5701 31.7675 -.25 11.9027
  [4,15,42.426,-.25,42.426,16.9736,-.25,9.7679,24.4088,-.25,10.5701,31.7675,-.25,11.9027],
// 4 15 42.426 -.25 42.426 31.7675 -.25 11.9027 39.0119 -.25 13.7586 46.1049 -.25 16.1284
  [4,15,42.426,-.25,42.426,31.7675,-.25,11.9027,39.0119,-.25,13.7586,46.1049,-.25,16.1284],
// 4 15 42.426 -.25 42.426 46.1049 -.25 16.1284 53.01 -.25 19 55.434 -.25 22.962
  [4,15,42.426,-.25,42.426,46.1049,-.25,16.1284,53.01,-.25,19,55.434,-.25,22.962],
// 3 15 -60 -.25 0 -53.01 -.25 19 -55.434 -.25 22.962
  [3,15,-60,-.25,0,-53.01,-.25,19,-55.434,-.25,22.962],
// 3 15 -60 -.25 0 -53.01 -.25 -19 -53.01 -.25 19
  [3,15,-60,-.25,0,-53.01,-.25,-19,-53.01,-.25,19],
// 3 15 -60 -.25 0 -55.434 -.25 -22.962 -53.01 -.25 -19
  [3,15,-60,-.25,0,-55.434,-.25,-22.962,-53.01,-.25,-19],
// 3 15 60 -.25 0 55.434 -.25 22.962 53.01 -.25 19
  [3,15,60,-.25,0,55.434,-.25,22.962,53.01,-.25,19],
// 3 15 60 -.25 0 53.01 -.25 19 53.01 -.25 -19
  [3,15,60,-.25,0,53.01,-.25,19,53.01,-.25,-19],
// 3 15 60 -.25 0 53.01 -.25 -19 55.434 -.25 -22.962
  [3,15,60,-.25,0,53.01,-.25,-19,55.434,-.25,-22.962],
// 4 15 -42.426 -.25 -42.426 -46.1049 -.25 -16.1284 -53.01 -.25 -19 -55.434 -.25 -22.962
  [4,15,-42.426,-.25,-42.426,-46.1049,-.25,-16.1284,-53.01,-.25,-19,-55.434,-.25,-22.962],
// 4 15 -42.426 -.25 -42.426 -31.7675 -.25 -11.9027 -39.0119 -.25 -13.7586 -46.1049 -.25 -16.1284
  [4,15,-42.426,-.25,-42.426,-31.7675,-.25,-11.9027,-39.0119,-.25,-13.7586,-46.1049,-.25,-16.1284],
// 4 15 -42.426 -.25 -42.426 -16.9736 -.25 -9.7679 -24.4088 -.25 -10.5701 -31.7675 -.25 -11.9027
  [4,15,-42.426,-.25,-42.426,-16.9736,-.25,-9.7679,-24.4088,-.25,-10.5701,-31.7675,-.25,-11.9027],
// 4 15 -42.426 -.25 -42.426 -9.7679 -.25 -16.9736 -9.5 -.25 -9.5 -16.9736 -.25 -9.7679
  [4,15,-42.426,-.25,-42.426,-9.7679,-.25,-16.9736,-9.5,-.25,-9.5,-16.9736,-.25,-9.7679],
// 4 15 -42.426 -.25 -42.426 -11.9027 -.25 -31.7675 -10.5701 -.25 -24.4088 -9.7679 -.25 -16.9736
  [4,15,-42.426,-.25,-42.426,-11.9027,-.25,-31.7675,-10.5701,-.25,-24.4088,-9.7679,-.25,-16.9736],
// 4 15 -42.426 -.25 -42.426 -16.1284 -.25 -46.1049 -13.7586 -.25 -39.0119 -11.9027 -.25 -31.7675
  [4,15,-42.426,-.25,-42.426,-16.1284,-.25,-46.1049,-13.7586,-.25,-39.0119,-11.9027,-.25,-31.7675],
// 4 15 -42.426 -.25 -42.426 -22.962 -.25 -55.434 -19 -.25 -53.01 -16.1284 -.25 -46.1049
  [4,15,-42.426,-.25,-42.426,-22.962,-.25,-55.434,-19,-.25,-53.01,-16.1284,-.25,-46.1049],
// 4 15 42.426 -.25 -42.426 55.434 -.25 -22.962 53.01 -.25 -19 46.1049 -.25 -16.1284
  [4,15,42.426,-.25,-42.426,55.434,-.25,-22.962,53.01,-.25,-19,46.1049,-.25,-16.1284],
// 4 15 42.426 -.25 -42.426 46.1049 -.25 -16.1284 39.0119 -.25 -13.7586 31.7675 -.25 -11.9027
  [4,15,42.426,-.25,-42.426,46.1049,-.25,-16.1284,39.0119,-.25,-13.7586,31.7675,-.25,-11.9027],
// 4 15 42.426 -.25 -42.426 31.7675 -.25 -11.9027 24.4088 -.25 -10.5701 16.9736 -.25 -9.7679
  [4,15,42.426,-.25,-42.426,31.7675,-.25,-11.9027,24.4088,-.25,-10.5701,16.9736,-.25,-9.7679],
// 4 15 42.426 -.25 -42.426 16.9736 -.25 -9.7679 9.5 -.25 -9.5 9.7679 -.25 -16.9736
  [4,15,42.426,-.25,-42.426,16.9736,-.25,-9.7679,9.5,-.25,-9.5,9.7679,-.25,-16.9736],
// 4 15 42.426 -.25 -42.426 9.7679 -.25 -16.9736 10.5701 -.25 -24.4088 11.9027 -.25 -31.7675
  [4,15,42.426,-.25,-42.426,9.7679,-.25,-16.9736,10.5701,-.25,-24.4088,11.9027,-.25,-31.7675],
// 4 15 42.426 -.25 -42.426 11.9027 -.25 -31.7675 13.7586 -.25 -39.0119 16.1284 -.25 -46.1049
  [4,15,42.426,-.25,-42.426,11.9027,-.25,-31.7675,13.7586,-.25,-39.0119,16.1284,-.25,-46.1049],
// 4 15 42.426 -.25 -42.426 16.1284 -.25 -46.1049 19 -.25 -53.01 22.962 -.25 -55.434
  [4,15,42.426,-.25,-42.426,16.1284,-.25,-46.1049,19,-.25,-53.01,22.962,-.25,-55.434],
// 3 15 0 -.25 -60 -19 -.25 -53.01 -22.962 -.25 -55.434
  [3,15,0,-.25,-60,-19,-.25,-53.01,-22.962,-.25,-55.434],
// 3 15 0 -.25 -60 19 -.25 -53.01 -19 -.25 -53.01
  [3,15,0,-.25,-60,19,-.25,-53.01,-19,-.25,-53.01],
// 3 15 0 -.25 -60 22.962 -.25 -55.434 19 -.25 -53.01
  [3,15,0,-.25,-60,22.962,-.25,-55.434,19,-.25,-53.01],
];
module ldraw_lib__4179107d(step=0, col=false, unit=2/5, alt=false, line=0.2, solid=!$preview)
    makepoly(ldraw_lib__4179107d(), step=step, col=col, unit=unit, alt=alt, line=line, solid=solid);
ldraw_lib__4179107d(line=0.2);
